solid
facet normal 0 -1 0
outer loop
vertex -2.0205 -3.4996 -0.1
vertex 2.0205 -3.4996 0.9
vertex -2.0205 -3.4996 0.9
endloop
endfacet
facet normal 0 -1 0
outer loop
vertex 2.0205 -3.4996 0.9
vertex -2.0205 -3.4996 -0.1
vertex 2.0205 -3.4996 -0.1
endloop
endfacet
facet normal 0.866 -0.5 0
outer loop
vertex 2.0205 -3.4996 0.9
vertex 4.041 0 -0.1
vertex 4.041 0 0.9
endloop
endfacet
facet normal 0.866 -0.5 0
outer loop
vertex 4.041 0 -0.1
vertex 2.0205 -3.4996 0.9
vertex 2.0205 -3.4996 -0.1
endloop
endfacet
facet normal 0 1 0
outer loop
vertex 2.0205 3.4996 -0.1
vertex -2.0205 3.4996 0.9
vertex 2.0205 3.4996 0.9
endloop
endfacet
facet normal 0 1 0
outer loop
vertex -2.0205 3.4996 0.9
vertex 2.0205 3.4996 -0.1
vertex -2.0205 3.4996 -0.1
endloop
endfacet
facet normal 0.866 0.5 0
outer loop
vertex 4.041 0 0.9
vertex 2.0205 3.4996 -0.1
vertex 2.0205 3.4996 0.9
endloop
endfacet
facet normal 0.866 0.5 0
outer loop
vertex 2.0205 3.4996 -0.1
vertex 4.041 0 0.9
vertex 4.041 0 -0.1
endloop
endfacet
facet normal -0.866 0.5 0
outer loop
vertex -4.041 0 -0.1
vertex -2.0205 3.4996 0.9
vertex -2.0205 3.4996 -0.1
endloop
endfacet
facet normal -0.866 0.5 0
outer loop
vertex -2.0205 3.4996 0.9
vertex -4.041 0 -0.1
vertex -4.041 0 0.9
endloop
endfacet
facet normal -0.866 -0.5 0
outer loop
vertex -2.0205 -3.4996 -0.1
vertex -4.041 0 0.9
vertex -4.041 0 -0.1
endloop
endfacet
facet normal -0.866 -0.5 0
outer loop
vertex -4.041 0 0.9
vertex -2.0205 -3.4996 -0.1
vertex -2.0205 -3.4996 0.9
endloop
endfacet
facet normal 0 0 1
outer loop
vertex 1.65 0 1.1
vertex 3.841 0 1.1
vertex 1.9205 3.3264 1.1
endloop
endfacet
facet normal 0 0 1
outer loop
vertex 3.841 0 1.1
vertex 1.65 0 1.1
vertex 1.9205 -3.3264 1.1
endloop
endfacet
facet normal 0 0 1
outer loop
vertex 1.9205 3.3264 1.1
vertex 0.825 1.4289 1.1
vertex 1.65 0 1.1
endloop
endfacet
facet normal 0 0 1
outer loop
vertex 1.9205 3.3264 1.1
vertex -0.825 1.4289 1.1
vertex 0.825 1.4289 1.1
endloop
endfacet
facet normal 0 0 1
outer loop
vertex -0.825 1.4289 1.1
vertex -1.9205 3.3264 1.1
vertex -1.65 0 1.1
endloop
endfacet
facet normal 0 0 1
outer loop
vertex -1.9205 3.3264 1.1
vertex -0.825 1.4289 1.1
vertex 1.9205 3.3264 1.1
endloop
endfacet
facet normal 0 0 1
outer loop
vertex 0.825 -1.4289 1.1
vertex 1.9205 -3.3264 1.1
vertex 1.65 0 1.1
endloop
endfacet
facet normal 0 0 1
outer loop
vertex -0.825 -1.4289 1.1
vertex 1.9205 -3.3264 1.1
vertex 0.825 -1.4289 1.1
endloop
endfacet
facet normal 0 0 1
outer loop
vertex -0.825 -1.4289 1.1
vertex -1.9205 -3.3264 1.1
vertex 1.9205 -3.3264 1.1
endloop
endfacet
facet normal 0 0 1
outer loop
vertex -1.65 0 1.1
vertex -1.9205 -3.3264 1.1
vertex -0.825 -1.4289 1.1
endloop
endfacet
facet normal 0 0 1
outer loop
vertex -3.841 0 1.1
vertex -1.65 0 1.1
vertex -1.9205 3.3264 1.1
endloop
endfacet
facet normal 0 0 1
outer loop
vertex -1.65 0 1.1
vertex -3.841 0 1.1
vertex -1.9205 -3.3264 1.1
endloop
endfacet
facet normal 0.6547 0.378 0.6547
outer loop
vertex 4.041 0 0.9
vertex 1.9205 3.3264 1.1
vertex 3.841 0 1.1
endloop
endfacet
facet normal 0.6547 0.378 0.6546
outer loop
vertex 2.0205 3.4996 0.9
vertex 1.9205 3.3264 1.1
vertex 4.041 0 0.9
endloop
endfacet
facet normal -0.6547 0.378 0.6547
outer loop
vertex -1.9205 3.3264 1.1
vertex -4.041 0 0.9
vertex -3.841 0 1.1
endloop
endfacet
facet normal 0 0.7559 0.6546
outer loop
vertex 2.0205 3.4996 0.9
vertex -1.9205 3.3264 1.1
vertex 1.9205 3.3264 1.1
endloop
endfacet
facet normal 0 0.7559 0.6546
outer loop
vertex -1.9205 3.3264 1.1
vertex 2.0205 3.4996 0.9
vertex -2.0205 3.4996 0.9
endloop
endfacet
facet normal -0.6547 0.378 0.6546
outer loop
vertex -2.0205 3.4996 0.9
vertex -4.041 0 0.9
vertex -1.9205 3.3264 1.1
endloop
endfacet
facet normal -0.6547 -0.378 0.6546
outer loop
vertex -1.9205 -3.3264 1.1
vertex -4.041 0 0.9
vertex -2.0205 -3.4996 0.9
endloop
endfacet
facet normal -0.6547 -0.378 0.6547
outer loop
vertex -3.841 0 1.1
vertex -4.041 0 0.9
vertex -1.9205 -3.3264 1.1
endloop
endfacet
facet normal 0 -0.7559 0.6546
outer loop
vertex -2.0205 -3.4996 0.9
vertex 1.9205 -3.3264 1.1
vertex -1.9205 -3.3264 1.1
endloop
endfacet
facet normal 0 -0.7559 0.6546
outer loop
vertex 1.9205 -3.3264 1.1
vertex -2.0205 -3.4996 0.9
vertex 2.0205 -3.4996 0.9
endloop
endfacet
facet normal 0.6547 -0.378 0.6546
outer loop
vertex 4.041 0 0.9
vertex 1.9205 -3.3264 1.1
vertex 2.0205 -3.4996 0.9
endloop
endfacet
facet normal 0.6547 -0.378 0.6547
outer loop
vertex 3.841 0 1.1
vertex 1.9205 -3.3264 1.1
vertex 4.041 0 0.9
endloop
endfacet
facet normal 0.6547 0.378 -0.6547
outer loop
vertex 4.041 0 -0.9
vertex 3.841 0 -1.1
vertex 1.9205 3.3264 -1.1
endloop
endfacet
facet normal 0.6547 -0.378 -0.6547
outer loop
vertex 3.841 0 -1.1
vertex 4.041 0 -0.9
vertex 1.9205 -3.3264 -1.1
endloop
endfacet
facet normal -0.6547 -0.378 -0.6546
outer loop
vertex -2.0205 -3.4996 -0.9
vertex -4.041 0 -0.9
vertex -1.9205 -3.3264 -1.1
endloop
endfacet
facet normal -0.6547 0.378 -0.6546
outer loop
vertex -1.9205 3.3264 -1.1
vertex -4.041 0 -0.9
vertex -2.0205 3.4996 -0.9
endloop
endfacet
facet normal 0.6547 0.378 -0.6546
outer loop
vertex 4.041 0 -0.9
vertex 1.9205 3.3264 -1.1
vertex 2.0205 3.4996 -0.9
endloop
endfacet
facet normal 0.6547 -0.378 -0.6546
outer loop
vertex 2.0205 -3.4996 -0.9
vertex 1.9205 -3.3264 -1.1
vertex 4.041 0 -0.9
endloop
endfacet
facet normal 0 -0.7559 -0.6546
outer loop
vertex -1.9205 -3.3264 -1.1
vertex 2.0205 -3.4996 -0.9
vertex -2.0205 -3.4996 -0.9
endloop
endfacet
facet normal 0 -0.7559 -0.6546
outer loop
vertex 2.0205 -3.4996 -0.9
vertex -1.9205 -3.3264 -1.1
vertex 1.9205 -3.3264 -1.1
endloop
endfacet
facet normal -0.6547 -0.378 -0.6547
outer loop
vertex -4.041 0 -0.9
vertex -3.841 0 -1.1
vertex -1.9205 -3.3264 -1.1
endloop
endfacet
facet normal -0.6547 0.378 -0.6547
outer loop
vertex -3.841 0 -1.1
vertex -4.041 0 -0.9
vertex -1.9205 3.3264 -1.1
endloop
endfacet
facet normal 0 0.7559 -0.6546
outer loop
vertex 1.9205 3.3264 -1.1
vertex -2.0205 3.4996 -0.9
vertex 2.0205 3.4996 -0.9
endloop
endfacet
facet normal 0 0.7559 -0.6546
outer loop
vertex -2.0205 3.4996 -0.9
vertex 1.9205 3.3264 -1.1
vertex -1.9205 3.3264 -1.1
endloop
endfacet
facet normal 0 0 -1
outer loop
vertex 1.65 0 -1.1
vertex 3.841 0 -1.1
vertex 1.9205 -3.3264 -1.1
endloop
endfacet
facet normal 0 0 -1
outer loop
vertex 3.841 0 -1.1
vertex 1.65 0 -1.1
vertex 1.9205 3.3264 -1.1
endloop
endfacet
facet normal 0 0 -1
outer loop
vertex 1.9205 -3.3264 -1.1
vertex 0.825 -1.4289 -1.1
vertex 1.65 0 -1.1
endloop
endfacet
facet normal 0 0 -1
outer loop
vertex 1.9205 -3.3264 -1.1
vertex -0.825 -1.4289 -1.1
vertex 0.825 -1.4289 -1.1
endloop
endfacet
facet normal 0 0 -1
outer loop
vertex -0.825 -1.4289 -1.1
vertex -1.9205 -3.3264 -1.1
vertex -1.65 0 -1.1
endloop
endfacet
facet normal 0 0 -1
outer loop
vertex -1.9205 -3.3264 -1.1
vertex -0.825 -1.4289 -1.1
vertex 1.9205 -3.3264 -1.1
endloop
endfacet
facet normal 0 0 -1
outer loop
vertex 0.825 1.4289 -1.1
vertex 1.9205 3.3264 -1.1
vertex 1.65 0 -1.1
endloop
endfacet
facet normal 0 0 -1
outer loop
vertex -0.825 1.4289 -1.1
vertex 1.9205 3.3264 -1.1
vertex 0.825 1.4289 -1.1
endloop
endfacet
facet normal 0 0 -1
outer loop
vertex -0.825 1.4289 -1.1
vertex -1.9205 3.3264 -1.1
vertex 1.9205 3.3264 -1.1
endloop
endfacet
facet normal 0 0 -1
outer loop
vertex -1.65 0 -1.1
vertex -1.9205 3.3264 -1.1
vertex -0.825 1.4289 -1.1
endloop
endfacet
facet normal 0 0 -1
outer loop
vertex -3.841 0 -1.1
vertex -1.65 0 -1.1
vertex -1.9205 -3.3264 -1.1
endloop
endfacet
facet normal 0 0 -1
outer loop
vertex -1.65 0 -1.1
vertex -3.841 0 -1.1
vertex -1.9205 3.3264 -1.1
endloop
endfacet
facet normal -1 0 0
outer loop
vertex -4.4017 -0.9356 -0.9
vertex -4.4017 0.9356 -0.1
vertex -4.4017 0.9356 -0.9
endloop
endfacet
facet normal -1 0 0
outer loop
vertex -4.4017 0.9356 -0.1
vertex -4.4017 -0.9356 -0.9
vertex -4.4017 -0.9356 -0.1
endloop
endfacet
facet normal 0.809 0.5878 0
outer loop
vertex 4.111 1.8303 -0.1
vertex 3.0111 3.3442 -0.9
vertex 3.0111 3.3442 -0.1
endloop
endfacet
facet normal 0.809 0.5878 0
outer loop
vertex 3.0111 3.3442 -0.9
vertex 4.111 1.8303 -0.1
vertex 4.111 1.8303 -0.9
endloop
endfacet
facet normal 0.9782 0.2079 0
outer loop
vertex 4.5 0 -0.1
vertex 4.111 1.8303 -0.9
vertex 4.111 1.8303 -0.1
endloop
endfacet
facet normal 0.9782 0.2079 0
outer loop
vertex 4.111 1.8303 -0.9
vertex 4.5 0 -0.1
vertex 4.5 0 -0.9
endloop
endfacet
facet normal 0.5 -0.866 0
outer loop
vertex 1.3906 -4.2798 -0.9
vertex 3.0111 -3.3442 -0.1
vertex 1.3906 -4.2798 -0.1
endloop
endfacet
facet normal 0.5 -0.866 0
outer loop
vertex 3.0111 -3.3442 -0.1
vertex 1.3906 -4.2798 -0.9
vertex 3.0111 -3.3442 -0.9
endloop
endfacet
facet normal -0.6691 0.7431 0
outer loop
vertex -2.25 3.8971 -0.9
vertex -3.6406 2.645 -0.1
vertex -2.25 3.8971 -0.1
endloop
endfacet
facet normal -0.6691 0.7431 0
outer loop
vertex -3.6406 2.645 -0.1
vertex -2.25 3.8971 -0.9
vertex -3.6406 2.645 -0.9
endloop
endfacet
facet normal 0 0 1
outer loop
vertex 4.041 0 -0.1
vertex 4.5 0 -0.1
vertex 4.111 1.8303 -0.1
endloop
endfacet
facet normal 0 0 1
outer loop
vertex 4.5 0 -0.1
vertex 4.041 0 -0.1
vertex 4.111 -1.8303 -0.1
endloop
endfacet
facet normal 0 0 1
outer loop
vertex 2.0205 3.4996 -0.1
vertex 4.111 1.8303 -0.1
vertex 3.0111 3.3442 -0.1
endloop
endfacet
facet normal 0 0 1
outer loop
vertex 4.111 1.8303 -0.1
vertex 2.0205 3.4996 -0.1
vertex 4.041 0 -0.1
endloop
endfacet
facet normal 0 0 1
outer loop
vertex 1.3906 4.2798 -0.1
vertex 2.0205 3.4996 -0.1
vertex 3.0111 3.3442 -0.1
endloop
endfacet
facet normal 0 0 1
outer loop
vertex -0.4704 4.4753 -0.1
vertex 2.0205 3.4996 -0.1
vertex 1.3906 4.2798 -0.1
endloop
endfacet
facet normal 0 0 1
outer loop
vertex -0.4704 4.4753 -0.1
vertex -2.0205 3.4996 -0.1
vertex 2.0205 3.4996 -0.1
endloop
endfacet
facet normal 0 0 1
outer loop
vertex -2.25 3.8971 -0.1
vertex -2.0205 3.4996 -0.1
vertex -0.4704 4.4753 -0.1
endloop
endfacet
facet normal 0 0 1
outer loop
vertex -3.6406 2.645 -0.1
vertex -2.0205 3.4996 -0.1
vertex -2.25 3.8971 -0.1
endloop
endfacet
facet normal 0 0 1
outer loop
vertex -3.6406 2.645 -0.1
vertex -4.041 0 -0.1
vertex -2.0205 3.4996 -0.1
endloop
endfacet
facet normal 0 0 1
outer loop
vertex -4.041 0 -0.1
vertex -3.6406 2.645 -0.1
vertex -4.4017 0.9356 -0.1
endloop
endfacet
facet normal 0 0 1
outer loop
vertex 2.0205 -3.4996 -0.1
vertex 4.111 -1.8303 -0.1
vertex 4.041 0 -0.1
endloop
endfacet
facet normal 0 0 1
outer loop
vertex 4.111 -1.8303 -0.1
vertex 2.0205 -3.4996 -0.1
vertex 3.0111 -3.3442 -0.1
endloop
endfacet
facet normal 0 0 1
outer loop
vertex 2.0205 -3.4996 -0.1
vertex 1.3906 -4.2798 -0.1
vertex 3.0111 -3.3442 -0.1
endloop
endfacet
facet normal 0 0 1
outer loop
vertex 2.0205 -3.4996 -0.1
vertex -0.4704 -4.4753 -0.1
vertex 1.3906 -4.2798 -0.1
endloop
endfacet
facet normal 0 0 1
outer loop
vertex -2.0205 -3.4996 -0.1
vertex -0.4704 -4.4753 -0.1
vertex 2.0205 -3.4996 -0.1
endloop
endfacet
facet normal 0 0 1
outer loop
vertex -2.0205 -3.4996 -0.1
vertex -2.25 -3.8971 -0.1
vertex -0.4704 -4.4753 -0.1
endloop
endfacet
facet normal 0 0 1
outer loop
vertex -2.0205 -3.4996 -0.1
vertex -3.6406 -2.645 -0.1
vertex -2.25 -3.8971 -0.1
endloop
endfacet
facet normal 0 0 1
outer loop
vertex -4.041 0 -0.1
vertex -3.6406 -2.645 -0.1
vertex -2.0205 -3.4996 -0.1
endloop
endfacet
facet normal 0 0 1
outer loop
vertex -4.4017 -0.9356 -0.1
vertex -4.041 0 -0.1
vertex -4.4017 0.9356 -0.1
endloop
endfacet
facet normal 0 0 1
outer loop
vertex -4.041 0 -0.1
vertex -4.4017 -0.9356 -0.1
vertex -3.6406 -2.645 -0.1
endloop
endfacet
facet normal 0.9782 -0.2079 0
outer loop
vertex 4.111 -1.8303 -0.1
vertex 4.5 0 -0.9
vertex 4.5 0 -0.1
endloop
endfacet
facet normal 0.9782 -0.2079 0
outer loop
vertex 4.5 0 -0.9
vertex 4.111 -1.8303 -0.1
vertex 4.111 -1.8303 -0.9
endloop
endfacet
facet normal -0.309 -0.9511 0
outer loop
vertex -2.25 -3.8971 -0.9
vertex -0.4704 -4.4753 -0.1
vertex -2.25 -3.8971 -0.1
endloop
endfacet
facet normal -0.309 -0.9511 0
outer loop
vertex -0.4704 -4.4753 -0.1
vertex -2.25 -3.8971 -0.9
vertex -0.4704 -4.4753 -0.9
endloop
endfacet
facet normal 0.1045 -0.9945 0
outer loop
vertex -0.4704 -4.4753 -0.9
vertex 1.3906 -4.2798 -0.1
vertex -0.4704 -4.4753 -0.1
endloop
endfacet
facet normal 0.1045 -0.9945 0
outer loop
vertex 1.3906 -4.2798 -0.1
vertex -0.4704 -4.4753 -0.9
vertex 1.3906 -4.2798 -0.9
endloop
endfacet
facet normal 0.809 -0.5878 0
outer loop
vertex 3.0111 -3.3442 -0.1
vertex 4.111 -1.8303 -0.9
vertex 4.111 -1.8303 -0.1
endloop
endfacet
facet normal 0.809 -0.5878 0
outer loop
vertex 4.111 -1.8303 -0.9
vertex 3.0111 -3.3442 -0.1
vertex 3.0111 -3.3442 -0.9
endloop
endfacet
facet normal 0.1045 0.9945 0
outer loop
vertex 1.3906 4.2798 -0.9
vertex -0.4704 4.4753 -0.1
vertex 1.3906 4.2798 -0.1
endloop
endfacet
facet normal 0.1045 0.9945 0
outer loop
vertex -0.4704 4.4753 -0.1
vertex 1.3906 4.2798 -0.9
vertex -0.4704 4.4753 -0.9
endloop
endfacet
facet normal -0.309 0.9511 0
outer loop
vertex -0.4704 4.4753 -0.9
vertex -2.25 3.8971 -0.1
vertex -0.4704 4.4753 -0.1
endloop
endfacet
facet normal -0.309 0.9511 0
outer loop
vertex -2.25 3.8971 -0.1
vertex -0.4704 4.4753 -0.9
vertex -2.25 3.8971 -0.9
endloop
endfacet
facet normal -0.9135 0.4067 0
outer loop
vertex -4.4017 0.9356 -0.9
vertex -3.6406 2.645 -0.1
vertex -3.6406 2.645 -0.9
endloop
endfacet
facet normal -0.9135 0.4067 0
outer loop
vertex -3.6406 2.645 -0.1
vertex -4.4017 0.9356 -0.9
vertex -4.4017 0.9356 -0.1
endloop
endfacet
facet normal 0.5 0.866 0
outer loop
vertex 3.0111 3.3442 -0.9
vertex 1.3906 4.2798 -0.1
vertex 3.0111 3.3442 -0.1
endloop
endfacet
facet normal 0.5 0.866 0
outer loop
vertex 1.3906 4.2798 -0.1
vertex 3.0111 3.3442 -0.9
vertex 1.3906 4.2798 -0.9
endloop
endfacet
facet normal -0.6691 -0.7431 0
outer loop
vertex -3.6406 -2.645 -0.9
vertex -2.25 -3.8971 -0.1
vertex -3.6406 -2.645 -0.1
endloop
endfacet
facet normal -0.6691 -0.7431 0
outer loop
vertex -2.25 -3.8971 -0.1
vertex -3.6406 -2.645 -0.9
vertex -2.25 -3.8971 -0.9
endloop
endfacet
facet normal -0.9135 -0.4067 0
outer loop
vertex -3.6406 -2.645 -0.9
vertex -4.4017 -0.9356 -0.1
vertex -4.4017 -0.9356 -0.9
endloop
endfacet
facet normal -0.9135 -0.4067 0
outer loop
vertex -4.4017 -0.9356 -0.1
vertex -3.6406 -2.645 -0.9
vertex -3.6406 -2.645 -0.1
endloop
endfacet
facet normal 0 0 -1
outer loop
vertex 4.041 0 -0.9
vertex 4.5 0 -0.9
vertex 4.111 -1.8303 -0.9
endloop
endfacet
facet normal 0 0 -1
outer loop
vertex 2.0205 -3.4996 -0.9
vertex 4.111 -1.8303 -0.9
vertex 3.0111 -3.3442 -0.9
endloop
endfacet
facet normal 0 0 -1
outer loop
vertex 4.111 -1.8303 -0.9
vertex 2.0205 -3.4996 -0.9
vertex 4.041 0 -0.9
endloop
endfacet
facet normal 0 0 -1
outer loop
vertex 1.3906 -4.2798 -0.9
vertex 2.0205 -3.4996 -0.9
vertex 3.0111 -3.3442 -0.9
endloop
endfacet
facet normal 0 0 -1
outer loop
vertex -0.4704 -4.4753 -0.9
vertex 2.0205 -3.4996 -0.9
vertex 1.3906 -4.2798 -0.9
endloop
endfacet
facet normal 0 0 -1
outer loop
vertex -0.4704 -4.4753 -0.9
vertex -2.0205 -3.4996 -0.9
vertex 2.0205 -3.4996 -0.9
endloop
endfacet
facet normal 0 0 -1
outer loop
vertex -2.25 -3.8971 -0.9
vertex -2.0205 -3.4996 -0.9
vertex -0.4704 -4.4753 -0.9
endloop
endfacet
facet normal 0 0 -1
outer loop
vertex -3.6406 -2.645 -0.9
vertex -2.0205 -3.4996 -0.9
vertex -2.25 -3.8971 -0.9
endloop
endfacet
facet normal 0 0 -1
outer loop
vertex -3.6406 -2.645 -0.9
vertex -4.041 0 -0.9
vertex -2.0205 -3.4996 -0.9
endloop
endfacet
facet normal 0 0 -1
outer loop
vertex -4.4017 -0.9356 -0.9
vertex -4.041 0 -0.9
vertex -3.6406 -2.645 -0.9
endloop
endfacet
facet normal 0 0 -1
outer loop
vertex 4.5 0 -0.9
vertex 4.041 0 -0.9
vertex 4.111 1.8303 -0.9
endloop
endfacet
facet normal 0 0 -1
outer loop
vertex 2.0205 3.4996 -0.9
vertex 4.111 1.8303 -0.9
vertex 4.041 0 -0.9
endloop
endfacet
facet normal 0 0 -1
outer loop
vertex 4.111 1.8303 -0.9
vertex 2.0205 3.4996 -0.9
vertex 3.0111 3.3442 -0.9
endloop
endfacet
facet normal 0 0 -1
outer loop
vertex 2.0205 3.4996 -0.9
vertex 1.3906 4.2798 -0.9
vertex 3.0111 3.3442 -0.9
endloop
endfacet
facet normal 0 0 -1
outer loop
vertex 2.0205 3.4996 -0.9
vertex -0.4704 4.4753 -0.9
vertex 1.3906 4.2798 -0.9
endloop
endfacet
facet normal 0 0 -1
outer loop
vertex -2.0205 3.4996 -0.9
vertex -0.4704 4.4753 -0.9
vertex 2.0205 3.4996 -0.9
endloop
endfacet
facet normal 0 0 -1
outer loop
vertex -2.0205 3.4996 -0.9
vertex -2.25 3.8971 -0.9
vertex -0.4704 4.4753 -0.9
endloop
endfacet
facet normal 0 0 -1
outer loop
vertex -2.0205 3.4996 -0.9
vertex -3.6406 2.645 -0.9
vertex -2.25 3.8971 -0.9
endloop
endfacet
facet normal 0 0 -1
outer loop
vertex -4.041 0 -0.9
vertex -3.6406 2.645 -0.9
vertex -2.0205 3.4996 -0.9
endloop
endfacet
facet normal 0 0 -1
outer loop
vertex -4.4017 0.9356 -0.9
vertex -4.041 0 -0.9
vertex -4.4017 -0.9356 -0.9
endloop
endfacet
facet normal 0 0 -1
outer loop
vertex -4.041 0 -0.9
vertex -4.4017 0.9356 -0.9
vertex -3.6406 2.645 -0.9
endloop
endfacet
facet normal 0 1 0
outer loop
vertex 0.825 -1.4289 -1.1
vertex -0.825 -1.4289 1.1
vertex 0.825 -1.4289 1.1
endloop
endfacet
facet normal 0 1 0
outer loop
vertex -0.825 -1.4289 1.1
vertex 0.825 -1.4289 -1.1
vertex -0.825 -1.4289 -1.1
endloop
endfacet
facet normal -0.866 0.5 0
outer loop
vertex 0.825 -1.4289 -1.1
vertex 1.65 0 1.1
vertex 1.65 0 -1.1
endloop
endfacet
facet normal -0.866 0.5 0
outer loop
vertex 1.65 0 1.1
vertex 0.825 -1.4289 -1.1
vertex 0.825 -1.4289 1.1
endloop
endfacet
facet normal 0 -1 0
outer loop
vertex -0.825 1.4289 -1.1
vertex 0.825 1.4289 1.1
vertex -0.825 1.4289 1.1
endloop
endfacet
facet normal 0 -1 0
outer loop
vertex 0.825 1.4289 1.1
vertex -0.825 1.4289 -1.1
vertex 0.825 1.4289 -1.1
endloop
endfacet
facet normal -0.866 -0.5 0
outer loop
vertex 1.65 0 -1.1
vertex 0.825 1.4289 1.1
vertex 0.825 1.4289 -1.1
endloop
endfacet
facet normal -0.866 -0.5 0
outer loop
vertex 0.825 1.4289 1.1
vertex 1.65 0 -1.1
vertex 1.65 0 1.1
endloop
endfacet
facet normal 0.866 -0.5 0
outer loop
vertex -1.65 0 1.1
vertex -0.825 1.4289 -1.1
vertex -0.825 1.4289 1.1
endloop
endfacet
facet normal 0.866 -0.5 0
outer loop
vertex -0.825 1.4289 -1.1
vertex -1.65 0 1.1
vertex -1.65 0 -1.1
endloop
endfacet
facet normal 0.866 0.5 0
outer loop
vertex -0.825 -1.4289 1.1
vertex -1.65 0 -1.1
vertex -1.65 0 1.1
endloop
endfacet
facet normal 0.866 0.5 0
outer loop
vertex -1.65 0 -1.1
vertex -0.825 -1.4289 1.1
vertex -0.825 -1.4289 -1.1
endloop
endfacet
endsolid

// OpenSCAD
// Parameters
thread_nominal_diameter = 4.0; //[2.0:8.0:0.1]
thread_pitch = 0.7; //[0.35:1.4:0.05]
across_flats = 7.0; //[3.5:14.0:0.1]
thickness = 2.2; //[1.1:4.4:0.1]
hole_type = 1; //[0:1:1]
tolerance_clearance = 0.0; //[0.0:0.5:0.05]
chamfer_size = 0.2; //[0.1:0.6:0.05]
overlap = 0.6; //[0.2:1.5:0.1]
washer_outer_diameter = 9.0; //[6.0:18.0:0.1]
washer_thickness = 0.8; //[0.4:1.6:0.05]
washer_inner_diameter = 4.3; //[4.0:5.5:0.05]
hex_circumradius = 4.041; //[2.0:8.5:0.001]
threaded_hole_diameter = 3.3; //[2.0:6.5:0.05]

// Connectivity helper: enforce a minimum overlap of 1..2mm for unions
union_overlap = max(1.0, min(2.0, overlap));

module nut_and_washer() {

  // Washer Z placement: ensure washer intersects nut by union_overlap
  // Nut spans: [-thickness/2, +thickness/2]
  // Washer spans: [z_w - washer_thickness/2, z_w + washer_thickness/2]
  // Set washer top inside nut bottom by union_overlap:
  // z_w + washer_thickness/2 = -thickness/2 + union_overlap
  z_washer = -thickness/2 + union_overlap - washer_thickness/2;

  hole_r = (hole_type*threaded_hole_diameter + (1-hole_type)*(thread_nominal_diameter + tolerance_clearance))/2;

  // Make the nut body as a single solid (no internal difference that can create slivers)
  // by intersecting a hex prism with a chamfered "envelope".
  module chamfered_hex_prism(r, h, c) {
    // Clamp chamfer to avoid degeneracy
    c_eff = min(c, h/2 - 0.01);

    intersection() {
      // Hex prism
      cylinder(r=r, h=h, center=true, $fn=6);

      // Chamfer envelope: middle straight section + two frustums
      union() {
        // Middle straight section
        cylinder(r=r, h=max(0.01, h - 2*c_eff), center=true, $fn=6);

        // Top chamfer frustum
        translate([0,0, (h/2 - c_eff/2)])
          cylinder(r1=r, r2=max(0.01, r - c_eff), h=c_eff, center=true, $fn=6);

        // Bottom chamfer frustum
        translate([0,0, -(h/2 - c_eff/2)])
          cylinder(r1=max(0.01, r - c_eff), r2=r, h=c_eff, center=true, $fn=6);
      }
    }
  }

  // Build as one manifold: (nut + washer) minus (through hole)
  difference() {
    union() {
      // Nut (single solid, avoids floating sliver fragments from coplanar/near-coplanar cuts)
      color("DimGray")
        chamfered_hex_prism(hex_circumradius, thickness, chamfer_size);

      // Washer: ensure physical intersection with nut by union_overlap
      color("Silver")
      translate([0, 0, z_washer])
      difference() {
        cylinder(r=washer_outer_diameter/2, h=washer_thickness, center=true);
        cylinder(r=washer_inner_diameter/2, h=washer_thickness + 2*union_overlap, center=true);
      }
    }

    // Central through hole (single subtraction through entire combined part)
    cylinder(r=hole_r, h=thickness + washer_thickness + 4*union_overlap, center=true);
  }
}

// Assembly
module assembly() {
  nut_and_washer();
}

assembly();
